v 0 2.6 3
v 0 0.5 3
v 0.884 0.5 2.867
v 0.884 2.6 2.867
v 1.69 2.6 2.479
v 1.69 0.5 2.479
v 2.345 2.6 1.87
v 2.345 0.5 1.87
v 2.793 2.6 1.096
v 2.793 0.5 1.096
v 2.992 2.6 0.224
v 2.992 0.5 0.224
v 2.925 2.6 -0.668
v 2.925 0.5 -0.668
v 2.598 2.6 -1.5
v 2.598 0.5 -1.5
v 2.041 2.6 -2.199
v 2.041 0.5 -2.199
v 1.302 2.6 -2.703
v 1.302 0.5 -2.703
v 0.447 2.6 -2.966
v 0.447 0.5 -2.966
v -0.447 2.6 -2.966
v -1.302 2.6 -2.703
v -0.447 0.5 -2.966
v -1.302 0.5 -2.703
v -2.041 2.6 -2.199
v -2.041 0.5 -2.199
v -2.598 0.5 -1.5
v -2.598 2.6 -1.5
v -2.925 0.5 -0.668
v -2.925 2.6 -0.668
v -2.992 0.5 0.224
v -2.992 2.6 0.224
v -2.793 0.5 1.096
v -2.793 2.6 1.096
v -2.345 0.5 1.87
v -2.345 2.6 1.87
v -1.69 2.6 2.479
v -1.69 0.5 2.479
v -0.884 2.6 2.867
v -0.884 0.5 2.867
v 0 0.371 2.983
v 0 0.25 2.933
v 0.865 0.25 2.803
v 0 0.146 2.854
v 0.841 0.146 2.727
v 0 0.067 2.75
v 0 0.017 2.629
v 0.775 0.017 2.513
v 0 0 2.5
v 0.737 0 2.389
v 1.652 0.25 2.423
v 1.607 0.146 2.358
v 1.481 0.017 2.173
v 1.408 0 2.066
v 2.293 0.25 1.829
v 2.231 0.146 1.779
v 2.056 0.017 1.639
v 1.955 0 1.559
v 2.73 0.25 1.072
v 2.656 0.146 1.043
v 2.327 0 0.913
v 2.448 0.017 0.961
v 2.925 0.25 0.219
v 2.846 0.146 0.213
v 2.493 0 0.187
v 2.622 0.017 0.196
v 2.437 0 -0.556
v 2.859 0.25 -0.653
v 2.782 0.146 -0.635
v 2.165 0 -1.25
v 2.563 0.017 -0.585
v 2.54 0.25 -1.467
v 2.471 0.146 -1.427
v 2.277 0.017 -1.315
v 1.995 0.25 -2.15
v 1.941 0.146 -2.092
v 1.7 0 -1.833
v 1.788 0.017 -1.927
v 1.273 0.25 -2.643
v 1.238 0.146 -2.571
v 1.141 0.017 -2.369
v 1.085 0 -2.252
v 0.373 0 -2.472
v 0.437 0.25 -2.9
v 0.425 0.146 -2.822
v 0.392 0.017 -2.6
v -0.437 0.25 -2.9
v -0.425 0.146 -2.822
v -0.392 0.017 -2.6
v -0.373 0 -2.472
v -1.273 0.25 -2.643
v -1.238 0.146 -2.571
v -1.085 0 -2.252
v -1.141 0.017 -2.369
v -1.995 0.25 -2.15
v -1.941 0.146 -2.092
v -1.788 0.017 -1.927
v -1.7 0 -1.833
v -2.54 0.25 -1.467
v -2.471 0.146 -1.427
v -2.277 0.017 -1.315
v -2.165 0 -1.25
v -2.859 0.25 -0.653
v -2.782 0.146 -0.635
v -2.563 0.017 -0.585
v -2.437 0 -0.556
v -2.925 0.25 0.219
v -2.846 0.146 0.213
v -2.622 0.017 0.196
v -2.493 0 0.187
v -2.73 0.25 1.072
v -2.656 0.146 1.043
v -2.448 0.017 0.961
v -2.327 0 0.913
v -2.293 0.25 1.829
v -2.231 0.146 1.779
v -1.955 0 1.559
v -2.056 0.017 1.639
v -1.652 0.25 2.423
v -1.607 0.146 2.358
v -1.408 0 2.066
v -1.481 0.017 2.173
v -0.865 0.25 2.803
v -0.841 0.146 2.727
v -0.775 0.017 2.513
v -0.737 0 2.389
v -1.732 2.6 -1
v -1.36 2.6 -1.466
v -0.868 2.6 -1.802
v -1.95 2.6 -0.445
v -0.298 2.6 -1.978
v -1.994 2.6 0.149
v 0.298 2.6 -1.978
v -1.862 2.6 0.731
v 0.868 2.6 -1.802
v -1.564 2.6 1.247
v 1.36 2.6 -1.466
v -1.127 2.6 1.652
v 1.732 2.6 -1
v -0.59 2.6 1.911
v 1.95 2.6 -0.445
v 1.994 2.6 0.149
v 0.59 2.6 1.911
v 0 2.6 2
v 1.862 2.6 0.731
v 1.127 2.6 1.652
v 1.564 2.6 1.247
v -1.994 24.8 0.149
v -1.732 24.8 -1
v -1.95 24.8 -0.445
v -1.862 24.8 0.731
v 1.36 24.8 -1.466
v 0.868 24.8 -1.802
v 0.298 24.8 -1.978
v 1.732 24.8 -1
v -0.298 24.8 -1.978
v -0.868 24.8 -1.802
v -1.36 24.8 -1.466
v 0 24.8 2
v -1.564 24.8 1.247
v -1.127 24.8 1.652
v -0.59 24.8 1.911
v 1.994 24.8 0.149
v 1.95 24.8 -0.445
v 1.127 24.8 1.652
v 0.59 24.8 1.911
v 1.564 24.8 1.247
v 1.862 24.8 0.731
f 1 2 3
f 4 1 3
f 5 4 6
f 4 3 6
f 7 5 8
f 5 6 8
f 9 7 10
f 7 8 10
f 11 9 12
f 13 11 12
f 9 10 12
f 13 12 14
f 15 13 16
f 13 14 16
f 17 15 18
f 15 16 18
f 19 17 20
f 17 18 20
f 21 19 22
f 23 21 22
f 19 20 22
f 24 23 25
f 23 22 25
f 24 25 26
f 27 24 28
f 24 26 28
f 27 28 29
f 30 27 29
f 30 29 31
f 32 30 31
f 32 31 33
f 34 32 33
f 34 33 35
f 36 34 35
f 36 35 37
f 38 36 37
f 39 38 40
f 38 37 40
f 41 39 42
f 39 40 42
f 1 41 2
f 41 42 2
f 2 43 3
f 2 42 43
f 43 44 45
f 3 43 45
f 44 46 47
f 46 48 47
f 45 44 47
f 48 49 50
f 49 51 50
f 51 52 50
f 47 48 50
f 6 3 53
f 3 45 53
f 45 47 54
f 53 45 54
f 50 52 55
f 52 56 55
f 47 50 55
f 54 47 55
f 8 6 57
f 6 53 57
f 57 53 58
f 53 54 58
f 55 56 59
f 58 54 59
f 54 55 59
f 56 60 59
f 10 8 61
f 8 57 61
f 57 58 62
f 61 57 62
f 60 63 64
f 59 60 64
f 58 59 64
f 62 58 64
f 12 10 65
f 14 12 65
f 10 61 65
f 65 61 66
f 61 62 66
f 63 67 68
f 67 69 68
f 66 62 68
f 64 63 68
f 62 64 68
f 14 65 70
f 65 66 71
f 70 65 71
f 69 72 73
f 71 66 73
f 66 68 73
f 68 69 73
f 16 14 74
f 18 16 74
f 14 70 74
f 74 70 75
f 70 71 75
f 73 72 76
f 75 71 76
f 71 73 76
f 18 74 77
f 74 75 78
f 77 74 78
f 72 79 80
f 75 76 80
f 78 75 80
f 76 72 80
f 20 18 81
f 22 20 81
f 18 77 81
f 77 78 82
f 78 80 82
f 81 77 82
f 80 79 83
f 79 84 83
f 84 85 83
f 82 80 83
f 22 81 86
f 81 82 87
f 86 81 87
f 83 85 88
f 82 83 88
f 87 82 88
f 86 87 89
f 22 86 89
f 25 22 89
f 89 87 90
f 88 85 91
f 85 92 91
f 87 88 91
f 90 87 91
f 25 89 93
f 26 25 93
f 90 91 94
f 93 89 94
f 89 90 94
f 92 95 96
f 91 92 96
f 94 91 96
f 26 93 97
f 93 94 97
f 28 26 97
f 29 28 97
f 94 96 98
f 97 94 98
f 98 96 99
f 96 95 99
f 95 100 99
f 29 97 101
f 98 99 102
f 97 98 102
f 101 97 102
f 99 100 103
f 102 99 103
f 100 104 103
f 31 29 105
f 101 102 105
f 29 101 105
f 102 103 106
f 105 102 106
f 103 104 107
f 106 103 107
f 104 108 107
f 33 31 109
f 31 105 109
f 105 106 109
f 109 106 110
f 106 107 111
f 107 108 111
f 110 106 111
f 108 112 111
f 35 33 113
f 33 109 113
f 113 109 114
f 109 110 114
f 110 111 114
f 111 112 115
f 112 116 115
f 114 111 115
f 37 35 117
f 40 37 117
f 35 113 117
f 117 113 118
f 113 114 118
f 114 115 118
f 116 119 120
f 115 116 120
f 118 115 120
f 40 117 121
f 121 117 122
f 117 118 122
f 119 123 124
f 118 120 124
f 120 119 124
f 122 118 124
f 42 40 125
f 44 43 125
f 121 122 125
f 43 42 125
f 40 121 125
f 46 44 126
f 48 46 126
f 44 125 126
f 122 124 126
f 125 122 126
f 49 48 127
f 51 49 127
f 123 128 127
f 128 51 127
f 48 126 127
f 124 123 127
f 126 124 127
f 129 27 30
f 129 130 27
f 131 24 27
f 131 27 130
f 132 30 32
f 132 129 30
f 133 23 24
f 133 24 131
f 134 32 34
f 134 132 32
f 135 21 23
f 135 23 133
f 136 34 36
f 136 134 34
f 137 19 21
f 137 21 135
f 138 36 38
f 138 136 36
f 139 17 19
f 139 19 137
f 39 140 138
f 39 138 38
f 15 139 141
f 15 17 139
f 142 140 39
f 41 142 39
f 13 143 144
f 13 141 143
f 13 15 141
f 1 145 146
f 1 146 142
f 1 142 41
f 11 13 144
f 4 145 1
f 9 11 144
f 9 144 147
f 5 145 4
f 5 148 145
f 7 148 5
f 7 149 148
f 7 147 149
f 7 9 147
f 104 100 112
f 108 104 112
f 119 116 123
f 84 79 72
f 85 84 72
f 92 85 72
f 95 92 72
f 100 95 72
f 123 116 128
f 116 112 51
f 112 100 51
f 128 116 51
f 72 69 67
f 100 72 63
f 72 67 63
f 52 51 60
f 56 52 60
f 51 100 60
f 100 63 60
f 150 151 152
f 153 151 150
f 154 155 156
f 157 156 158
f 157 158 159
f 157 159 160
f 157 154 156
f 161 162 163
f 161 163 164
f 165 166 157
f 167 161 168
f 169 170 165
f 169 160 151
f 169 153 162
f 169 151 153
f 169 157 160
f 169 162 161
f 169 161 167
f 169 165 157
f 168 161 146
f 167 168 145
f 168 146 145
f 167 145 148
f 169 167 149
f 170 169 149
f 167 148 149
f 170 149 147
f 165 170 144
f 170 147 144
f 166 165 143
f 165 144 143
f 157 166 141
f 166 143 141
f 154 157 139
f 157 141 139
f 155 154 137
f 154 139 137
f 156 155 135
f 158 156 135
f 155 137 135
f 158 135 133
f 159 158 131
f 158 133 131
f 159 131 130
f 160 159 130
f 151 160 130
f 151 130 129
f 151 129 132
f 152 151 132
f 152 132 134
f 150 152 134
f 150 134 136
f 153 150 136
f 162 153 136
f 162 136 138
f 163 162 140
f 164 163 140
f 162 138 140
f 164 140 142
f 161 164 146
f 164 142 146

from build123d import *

# Parameters (mm, degrees)
SKETCH_1_R      = 3
EXTRUDE_1_DEPTH = 2.6
SKETCH_2_R      = 2
EXTRUDE_2_DEPTH = 22.2
FILLET_1_R      = 0.5


with BuildPart() as part:
    # 草图1 → 凸台-拉伸1 (new body)
    with BuildSketch(Plane(origin=(0, 0, 0), x_dir=(1, 0, 0), z_dir=(0, 1, 0))):
        with Locations(Location((0, 0, 0), (0, 0, 270))):
            Circle(SKETCH_1_R)
    extrude(amount=EXTRUDE_1_DEPTH)

    # 草图2 → 凸台-拉伸2 (add)
    with BuildSketch(Plane(origin=(0, 2.6, 0), x_dir=(1, 0, 0), z_dir=(0, 1, 0))):
        with Locations(Location((0, 0, 0), (0, 0, 270))):
            Circle(SKETCH_2_R)
    extrude(amount=EXTRUDE_2_DEPTH)

    # 圆角1
    fillet_1_edges = [part.edges().sort_by_distance(p)[0] for p in [
        (0, 0, -3),
    ]]
    fillet(fillet_1_edges, radius=FILLET_1_R)


solid = part.part
